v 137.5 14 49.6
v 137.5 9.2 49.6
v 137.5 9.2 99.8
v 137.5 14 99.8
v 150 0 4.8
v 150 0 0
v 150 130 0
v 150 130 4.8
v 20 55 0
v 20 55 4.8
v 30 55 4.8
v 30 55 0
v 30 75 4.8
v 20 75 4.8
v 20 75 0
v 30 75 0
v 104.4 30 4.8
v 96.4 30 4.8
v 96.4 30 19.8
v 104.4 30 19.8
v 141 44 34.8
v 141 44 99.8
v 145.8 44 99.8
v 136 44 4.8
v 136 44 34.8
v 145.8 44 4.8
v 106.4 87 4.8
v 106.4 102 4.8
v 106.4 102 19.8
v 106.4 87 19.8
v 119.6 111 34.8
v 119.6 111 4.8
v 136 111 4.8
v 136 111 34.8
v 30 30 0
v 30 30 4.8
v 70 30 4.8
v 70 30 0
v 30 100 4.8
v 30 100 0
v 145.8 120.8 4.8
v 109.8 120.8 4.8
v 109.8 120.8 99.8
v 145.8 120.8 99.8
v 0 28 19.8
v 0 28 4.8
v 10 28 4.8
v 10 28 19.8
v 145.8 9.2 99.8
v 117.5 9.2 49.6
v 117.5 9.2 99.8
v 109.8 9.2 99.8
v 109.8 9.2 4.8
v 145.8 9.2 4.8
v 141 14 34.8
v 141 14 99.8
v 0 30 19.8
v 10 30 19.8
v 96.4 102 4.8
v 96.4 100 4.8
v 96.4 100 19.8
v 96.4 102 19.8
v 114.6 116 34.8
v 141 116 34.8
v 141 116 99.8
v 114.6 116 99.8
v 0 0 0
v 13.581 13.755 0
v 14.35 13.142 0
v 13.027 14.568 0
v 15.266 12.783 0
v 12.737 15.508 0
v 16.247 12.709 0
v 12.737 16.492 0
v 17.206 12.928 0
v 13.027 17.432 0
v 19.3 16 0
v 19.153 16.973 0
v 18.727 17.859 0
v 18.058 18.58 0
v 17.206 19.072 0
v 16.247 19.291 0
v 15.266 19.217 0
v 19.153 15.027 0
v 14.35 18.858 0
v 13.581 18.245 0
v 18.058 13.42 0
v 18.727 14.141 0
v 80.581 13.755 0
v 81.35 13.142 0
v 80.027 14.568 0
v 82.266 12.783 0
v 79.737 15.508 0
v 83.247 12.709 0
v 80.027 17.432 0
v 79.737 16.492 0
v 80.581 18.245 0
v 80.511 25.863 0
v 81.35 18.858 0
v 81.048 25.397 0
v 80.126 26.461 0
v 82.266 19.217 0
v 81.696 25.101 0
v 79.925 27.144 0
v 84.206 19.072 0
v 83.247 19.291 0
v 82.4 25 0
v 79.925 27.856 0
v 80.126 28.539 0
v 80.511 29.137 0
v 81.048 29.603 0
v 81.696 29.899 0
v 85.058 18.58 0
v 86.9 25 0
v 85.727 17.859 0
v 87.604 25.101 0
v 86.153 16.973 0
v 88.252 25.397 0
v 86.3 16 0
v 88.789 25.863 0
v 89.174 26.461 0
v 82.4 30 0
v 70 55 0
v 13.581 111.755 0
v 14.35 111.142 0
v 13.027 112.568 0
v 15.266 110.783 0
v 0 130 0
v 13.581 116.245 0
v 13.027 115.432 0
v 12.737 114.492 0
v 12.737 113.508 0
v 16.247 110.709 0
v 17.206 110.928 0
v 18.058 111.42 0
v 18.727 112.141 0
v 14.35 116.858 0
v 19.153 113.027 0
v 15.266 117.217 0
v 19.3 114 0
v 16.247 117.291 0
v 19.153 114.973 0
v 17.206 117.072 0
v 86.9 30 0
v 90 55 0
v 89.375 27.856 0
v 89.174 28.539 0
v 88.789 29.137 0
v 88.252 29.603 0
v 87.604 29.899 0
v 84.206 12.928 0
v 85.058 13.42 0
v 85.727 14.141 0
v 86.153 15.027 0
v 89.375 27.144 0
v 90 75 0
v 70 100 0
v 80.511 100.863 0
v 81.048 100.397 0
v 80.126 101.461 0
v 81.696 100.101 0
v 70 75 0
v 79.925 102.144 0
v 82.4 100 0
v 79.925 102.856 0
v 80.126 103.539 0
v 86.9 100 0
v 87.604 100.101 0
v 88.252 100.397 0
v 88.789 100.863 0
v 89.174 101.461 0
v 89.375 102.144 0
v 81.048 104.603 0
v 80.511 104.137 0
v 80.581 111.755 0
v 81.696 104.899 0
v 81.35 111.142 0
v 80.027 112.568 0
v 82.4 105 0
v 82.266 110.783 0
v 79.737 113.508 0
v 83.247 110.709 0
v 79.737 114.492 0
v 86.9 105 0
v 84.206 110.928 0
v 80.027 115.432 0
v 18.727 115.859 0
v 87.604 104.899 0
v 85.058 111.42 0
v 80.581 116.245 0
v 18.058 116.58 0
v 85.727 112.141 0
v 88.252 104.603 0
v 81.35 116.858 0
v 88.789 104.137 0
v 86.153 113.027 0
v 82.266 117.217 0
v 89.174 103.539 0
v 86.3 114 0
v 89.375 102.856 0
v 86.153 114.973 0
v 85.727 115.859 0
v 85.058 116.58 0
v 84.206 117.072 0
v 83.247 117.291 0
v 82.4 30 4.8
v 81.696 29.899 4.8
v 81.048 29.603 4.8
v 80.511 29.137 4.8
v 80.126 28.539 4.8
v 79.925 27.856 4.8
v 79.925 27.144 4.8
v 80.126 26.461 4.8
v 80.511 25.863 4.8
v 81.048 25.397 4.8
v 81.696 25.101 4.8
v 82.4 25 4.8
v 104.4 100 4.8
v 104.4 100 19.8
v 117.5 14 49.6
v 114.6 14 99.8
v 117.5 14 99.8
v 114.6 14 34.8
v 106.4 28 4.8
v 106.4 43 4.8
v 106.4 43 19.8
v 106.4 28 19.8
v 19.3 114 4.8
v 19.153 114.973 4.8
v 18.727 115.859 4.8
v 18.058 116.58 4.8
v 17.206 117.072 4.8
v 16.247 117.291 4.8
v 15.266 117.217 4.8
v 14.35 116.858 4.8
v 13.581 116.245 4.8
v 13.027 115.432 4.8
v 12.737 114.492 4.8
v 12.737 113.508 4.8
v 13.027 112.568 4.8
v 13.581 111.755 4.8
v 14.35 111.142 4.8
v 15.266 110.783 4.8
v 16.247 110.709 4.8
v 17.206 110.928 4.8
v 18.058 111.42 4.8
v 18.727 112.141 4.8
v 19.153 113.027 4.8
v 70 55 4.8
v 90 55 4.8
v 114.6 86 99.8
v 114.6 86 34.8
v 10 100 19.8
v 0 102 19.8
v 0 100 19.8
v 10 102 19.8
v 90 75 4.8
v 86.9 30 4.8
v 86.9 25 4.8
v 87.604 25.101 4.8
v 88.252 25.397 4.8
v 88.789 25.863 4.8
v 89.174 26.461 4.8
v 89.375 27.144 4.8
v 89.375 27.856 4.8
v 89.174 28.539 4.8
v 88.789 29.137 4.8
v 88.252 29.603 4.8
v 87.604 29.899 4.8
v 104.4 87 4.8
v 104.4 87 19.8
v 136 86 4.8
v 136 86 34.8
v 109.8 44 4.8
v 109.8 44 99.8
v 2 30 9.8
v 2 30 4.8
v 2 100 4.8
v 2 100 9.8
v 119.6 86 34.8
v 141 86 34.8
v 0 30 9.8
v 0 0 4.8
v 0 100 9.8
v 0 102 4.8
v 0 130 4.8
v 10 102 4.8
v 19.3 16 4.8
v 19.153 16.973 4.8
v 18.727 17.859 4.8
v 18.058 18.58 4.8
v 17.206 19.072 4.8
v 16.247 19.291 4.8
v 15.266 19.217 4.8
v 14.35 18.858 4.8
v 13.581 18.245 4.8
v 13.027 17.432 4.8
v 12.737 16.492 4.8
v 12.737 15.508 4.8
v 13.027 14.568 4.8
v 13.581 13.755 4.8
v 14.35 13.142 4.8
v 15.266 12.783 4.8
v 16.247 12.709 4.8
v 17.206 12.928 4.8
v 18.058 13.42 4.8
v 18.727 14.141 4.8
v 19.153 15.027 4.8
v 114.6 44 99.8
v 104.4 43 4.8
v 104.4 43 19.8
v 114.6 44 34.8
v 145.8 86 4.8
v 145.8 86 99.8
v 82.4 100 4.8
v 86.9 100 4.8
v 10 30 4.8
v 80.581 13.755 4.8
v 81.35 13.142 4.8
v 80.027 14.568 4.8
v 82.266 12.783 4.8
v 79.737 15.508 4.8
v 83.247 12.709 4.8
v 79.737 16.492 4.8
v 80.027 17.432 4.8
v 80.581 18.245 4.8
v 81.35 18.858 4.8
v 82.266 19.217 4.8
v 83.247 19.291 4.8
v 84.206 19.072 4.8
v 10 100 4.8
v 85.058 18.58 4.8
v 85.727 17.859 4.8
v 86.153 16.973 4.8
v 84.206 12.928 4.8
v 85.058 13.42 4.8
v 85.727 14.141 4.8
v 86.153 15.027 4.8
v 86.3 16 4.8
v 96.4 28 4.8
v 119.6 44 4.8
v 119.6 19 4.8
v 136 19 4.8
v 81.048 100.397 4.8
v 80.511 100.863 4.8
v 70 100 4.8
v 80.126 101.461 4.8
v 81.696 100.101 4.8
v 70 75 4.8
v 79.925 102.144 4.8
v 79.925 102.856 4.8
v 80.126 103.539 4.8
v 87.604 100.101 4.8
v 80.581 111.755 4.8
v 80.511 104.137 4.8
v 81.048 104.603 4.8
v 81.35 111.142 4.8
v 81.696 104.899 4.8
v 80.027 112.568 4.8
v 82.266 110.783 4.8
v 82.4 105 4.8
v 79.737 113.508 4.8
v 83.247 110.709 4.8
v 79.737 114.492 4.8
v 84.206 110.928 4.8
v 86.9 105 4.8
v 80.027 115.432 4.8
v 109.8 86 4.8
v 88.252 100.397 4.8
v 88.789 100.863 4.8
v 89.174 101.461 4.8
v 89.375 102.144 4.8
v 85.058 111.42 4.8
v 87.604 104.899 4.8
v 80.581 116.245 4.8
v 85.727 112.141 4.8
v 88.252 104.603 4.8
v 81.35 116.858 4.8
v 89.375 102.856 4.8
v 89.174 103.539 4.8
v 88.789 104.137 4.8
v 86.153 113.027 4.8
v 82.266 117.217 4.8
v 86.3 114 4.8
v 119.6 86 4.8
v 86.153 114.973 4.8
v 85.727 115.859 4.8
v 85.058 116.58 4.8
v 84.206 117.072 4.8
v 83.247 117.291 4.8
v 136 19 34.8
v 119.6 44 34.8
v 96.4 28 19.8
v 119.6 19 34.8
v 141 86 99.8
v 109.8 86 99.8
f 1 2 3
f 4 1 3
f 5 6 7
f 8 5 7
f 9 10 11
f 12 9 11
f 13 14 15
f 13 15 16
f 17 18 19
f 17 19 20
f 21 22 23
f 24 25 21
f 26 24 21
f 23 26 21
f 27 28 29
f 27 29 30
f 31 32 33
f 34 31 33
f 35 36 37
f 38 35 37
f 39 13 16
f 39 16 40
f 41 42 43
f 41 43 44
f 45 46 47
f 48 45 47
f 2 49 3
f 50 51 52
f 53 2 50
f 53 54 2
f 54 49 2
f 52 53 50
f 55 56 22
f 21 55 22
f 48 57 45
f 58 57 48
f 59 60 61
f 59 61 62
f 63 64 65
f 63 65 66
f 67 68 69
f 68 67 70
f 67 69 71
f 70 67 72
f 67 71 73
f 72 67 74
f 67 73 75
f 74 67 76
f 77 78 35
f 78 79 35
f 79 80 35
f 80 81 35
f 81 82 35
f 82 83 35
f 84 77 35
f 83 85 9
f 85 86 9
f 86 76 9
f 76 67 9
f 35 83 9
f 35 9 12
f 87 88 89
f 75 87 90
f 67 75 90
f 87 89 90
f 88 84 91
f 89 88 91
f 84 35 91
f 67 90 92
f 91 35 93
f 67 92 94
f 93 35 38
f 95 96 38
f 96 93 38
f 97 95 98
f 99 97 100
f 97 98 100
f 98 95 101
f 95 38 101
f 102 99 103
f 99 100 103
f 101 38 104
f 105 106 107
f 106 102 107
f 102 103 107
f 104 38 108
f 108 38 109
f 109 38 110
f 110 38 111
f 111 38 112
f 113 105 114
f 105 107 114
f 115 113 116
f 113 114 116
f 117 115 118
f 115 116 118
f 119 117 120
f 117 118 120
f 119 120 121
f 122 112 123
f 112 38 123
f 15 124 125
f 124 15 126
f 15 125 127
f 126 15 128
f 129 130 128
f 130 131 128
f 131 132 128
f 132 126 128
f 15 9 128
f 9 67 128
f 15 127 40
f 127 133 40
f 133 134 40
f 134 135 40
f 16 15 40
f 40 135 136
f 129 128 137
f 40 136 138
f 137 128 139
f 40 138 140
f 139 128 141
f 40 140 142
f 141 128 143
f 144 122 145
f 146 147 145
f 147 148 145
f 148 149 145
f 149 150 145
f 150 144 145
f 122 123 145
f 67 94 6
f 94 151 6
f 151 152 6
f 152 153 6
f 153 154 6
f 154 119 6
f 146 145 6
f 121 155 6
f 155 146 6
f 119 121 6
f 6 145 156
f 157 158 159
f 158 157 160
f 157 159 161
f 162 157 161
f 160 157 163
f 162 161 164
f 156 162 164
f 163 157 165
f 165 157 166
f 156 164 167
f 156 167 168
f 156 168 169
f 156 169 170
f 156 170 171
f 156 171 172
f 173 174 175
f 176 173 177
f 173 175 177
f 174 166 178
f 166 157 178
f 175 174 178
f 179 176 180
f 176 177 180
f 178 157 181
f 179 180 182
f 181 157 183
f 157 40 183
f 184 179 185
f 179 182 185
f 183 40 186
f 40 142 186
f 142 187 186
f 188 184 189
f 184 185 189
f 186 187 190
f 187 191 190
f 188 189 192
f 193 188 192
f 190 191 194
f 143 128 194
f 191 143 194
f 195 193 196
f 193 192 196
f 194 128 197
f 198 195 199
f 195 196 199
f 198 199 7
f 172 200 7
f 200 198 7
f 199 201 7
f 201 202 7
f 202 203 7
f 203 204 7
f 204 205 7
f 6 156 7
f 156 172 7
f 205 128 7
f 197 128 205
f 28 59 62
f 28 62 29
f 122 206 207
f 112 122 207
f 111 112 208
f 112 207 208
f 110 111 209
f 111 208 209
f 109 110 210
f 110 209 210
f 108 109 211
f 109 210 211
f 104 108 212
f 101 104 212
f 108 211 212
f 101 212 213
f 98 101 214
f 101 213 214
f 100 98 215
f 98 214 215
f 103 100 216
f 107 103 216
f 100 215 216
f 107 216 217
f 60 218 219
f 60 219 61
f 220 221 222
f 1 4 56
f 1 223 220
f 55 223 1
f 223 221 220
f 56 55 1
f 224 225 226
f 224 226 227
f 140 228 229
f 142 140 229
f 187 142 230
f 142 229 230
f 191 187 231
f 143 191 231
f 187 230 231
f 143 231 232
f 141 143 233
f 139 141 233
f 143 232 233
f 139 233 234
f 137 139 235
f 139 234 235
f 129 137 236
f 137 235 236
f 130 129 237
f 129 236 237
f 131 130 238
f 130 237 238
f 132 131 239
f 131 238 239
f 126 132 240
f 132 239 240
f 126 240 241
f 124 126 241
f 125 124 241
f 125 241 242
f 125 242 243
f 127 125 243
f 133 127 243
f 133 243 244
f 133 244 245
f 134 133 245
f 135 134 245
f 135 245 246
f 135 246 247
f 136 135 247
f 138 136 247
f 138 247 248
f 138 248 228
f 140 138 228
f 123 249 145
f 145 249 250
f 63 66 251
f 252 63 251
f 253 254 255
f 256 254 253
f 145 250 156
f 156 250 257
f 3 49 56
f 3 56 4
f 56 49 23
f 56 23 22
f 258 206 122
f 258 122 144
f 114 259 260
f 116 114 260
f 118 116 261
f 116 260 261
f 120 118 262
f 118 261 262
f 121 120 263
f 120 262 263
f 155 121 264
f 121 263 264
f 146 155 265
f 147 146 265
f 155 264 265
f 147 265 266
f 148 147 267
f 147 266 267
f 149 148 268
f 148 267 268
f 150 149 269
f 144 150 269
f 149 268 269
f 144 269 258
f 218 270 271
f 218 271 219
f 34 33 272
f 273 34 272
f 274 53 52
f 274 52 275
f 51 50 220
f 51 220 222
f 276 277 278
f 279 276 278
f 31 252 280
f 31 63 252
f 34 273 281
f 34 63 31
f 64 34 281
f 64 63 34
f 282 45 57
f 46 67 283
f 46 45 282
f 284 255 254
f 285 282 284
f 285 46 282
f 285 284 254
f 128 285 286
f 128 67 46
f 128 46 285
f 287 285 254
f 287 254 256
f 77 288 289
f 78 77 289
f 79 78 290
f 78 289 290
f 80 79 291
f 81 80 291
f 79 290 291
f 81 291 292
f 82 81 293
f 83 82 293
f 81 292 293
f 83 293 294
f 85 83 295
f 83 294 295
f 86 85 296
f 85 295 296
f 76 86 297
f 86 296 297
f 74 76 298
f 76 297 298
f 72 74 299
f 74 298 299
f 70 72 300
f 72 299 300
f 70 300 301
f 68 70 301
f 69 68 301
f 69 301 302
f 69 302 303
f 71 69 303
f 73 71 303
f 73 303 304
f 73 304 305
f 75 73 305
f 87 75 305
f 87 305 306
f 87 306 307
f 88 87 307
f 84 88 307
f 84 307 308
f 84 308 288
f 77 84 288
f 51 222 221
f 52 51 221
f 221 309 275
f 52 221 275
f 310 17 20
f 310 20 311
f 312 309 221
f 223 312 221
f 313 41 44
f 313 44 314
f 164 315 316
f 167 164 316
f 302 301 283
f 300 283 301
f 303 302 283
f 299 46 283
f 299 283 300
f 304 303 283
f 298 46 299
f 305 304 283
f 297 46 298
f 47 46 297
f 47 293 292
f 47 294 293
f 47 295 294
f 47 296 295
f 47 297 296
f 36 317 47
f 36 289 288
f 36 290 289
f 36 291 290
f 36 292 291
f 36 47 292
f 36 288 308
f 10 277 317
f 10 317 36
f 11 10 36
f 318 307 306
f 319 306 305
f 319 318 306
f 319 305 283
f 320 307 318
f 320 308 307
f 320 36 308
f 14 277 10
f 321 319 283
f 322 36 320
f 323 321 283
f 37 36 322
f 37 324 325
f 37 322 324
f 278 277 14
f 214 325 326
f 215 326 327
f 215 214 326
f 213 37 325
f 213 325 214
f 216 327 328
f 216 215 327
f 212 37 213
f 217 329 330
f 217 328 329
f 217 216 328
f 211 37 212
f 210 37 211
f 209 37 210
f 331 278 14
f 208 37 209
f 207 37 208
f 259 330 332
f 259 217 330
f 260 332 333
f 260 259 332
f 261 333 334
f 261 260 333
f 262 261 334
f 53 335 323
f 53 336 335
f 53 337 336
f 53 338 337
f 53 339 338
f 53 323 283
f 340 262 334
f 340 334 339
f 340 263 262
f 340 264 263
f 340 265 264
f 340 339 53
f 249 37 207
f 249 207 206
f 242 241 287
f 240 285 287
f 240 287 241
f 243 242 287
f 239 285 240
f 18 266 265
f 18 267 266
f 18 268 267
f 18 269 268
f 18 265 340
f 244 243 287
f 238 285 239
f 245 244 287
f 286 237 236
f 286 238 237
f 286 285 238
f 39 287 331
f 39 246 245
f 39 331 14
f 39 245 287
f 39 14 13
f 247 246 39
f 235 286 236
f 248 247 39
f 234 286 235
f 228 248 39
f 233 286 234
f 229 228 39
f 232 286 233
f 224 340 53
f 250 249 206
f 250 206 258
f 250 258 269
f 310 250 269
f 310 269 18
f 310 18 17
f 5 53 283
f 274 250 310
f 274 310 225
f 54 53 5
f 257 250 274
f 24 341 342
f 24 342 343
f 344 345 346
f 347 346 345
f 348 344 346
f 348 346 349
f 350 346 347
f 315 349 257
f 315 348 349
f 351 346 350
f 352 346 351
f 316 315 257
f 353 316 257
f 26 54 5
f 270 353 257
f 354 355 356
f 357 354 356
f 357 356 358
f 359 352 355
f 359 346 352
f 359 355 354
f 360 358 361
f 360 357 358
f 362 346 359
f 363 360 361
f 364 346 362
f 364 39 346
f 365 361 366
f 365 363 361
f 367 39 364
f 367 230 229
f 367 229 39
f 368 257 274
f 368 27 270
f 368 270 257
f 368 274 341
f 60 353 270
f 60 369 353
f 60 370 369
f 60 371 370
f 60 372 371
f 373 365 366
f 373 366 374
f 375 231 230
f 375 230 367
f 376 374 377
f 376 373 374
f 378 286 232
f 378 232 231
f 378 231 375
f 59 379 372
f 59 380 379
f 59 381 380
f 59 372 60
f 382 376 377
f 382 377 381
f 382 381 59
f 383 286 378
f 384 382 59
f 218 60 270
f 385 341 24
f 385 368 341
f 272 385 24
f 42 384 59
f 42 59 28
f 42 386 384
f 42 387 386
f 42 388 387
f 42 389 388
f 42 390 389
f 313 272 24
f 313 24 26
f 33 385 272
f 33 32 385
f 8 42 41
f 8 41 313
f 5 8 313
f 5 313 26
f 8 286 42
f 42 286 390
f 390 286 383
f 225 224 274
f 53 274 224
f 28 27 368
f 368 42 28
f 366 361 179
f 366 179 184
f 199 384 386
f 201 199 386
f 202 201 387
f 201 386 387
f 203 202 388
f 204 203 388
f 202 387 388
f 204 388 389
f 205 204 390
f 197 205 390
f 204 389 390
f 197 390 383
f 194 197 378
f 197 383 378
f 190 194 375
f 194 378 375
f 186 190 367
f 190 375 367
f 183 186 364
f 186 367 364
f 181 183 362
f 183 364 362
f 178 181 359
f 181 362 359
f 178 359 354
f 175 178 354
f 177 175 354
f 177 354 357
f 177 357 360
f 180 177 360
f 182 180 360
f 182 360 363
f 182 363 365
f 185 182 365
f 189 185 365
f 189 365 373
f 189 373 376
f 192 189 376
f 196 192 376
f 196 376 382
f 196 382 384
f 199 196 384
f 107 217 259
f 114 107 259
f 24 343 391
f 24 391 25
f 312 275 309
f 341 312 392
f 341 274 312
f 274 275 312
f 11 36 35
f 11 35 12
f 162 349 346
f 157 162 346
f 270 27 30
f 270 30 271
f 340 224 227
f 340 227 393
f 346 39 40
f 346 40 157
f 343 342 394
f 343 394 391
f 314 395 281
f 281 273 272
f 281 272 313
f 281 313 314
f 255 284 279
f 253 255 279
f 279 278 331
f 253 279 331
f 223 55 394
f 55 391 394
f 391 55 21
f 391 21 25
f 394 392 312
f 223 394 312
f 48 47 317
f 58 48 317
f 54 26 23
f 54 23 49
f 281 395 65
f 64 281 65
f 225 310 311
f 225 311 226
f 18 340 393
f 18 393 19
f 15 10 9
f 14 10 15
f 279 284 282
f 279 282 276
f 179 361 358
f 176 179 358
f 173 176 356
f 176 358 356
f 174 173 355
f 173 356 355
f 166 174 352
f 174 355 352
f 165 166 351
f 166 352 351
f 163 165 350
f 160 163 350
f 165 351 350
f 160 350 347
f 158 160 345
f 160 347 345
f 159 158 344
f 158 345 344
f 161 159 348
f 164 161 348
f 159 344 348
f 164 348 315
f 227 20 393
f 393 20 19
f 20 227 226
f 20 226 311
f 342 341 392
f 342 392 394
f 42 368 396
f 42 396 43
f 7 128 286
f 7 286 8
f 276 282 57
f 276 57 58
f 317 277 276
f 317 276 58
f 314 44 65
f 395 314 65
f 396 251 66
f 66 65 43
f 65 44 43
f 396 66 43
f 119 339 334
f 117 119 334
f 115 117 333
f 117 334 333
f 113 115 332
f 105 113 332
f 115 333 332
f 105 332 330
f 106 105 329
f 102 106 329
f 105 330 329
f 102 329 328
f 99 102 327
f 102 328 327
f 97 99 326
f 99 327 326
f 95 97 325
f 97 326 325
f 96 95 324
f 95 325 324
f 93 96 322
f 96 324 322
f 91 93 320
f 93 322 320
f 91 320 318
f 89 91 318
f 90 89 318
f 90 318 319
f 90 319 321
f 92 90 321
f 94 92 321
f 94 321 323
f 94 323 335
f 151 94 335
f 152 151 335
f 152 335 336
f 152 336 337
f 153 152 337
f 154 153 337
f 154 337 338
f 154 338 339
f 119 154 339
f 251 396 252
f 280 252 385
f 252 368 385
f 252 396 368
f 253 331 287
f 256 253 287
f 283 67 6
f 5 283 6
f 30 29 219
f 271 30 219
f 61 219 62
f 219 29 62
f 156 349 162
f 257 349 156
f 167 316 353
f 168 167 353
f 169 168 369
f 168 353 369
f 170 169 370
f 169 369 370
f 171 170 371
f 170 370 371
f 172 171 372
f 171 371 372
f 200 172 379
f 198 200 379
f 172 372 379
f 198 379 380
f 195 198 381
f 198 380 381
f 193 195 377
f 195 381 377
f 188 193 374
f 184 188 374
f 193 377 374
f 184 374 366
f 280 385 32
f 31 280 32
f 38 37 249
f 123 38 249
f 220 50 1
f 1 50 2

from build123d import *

# Parameters (mm, degrees)
SKETCH_W            = 150
SKETCH_H            = 130
PAD_DEPTH           = 4.8
SKETCH001_R         = 3.3
POCKET_DEPTH        = 4.801
MIRROREDSKETCH_R    = 3.3
POCKET001_DEPTH     = 4.801
MIRROREDSKETCH001_R = 3.3
POCKET002_DEPTH     = 4.801
MIRROREDSKETCH002_R = 3.3
POCKET003_DEPTH     = 4.801
SKETCH002_W         = 2
SKETCH002_H         = 70
PAD001_DEPTH        = 5
SKETCH003_W         = 10
SKETCH003_H         = 2
PAD002_DEPTH        = 15
MIRROREDSKETCH003_W = 10
MIRROREDSKETCH003_H = 2
PAD003_DEPTH        = 15
PAD004_DEPTH        = 15
PAD005_DEPTH        = 15
PAD006_DEPTH        = 95
PAD007_DEPTH        = 95
SKETCH007_W         = 20
SKETCH007_H         = 60
POCKET004_DEPTH     = 5
PAD008_DEPTH        = 30
PAD009_DEPTH        = 30
SKETCH009_W         = 40
SKETCH009_H         = 70
POCKET005_DEPTH     = 4.801
SKETCH010_W         = 70
SKETCH010_H         = 20
POCKET006_DEPTH     = 4.801
POCKET007_DEPTH     = 4.801
POCKET008_DEPTH     = 4.801


with BuildPart() as part:
    # Sketch → Pad (new body)
    with BuildSketch(Plane.XY):
        with Locations((75, 65)):
            Rectangle(SKETCH_W, SKETCH_H)
    extrude(amount=PAD_DEPTH)

    # Sketch001 (on Face6 of Pad) → Pocket (cut, through all)
    with BuildSketch(Plane.XY.offset(4.8)):
        with Locations((16, 16)):
            Circle(SKETCH001_R)
    extrude(amount=-POCKET_DEPTH, mode=Mode.SUBTRACT)

    # MirroredSketch → Pocket001 (cut, through all)
    with BuildSketch(Plane.XY.offset(4.8)):
        with Locations((16, 114)):
            Circle(MIRROREDSKETCH_R)
    extrude(amount=-POCKET001_DEPTH, mode=Mode.SUBTRACT)

    # MirroredSketch001 → Pocket002 (cut, through all)
    with BuildSketch(Plane.XY.offset(4.8)):
        with Locations((83, 16)):
            Circle(MIRROREDSKETCH001_R)
    extrude(amount=-POCKET002_DEPTH, mode=Mode.SUBTRACT)

    # MirroredSketch002 → Pocket003 (cut, through all)
    with BuildSketch(Plane.XY.offset(4.8)):
        with Locations((83, 114)):
            Circle(MIRROREDSKETCH002_R)
    extrude(amount=-POCKET003_DEPTH, mode=Mode.SUBTRACT)

    # Sketch002 (on Face5 of Pocket003) → Pad001 (join)
    with BuildSketch(Plane.XY.offset(4.8)):
        with Locations((1, 65)):
            Rectangle(SKETCH002_W, SKETCH002_H)
    extrude(amount=PAD001_DEPTH)

    # Sketch003 (on Face5 of Pad001) → Pad002 (join)
    with BuildSketch(Plane.XY.offset(4.8)):
        with Locations((5, 29)):
            Rectangle(SKETCH003_W, SKETCH003_H)
    extrude(amount=PAD002_DEPTH)

    # MirroredSketch003 → Pad003 (join)
    with BuildSketch(Plane.XY.offset(4.8)):
        with Locations((5, 101)):
            Rectangle(MIRROREDSKETCH003_W, MIRROREDSKETCH003_H)
    extrude(amount=PAD003_DEPTH)

    # Sketch004 (on Face5 of Pad003) → Pad004 (join)
    with BuildSketch(Plane.XY.offset(4.8)):
        Polygon((96.4, 100), (96.4, 102), (106.4, 102), (106.4, 87), (104.4, 87), (104.4, 100), align=None)
    extrude(amount=PAD004_DEPTH)

    # Sketch005 (on Face5 of Pad004) → Pad005 (join)
    with BuildSketch(Plane.XY.offset(4.8)):
        Polygon((96.4, 30), (104.4, 30), (104.4, 43), (106.4, 43), (106.4, 28), (96.4, 28), align=None)
    extrude(amount=PAD005_DEPTH)

    # Sketch006 (on Face5 of Pad005) → Pad006 (join)
    with BuildSketch(Plane.XY.offset(4.8)):
        Polygon((109.8, 86), (109.8, 120.8), (145.8, 120.8), (145.8, 86), (141, 86), (141, 116), (114.6, 116), (114.6, 86), align=None)
    extrude(amount=PAD006_DEPTH)

    # MirroredSketch005 → Pad007 (join)
    with BuildSketch(Plane.XY.offset(4.8)):
        Polygon((145.8, 44), (145.8, 9.2), (109.8, 9.2), (109.8, 44), (114.6, 44), (114.6, 14), (141, 14), (141, 44), align=None)
    extrude(amount=PAD007_DEPTH)

    # Sketch007 (on Face33 of Pad007) → Pocket004 (cut)
    with BuildSketch(Plane.XZ.offset(-9.2)):
        with Locations((127.5, 79.6)):
            Rectangle(SKETCH007_W, SKETCH007_H)
    extrude(amount=-POCKET004_DEPTH, mode=Mode.SUBTRACT)

    # Sketch008 (on Face5 of Pocket004) → Pad008 (join)
    with BuildSketch(Plane.XY.offset(4.8)):
        Polygon((114.6, 86), (119.6, 86), (119.6, 111), (136, 111), (136, 86), (141, 86), (141, 116), (114.6, 116), align=None)
    extrude(amount=PAD008_DEPTH)

    # MirroredSketch006 → Pad009 (join)
    with BuildSketch(Plane.XY.offset(4.8)):
        Polygon((114.6, 44), (119.6, 44), (119.6, 19), (136, 19), (136, 44), (141, 44), (141, 14), (114.6, 14), align=None)
    extrude(amount=PAD009_DEPTH)

    # Sketch009 (on Face5 of Pad009) → Pocket005 (cut, through all)
    with BuildSketch(Plane.XY.offset(4.8)):
        with Locations((50, 65)):
            Rectangle(SKETCH009_W, SKETCH009_H)
    extrude(amount=-POCKET005_DEPTH, mode=Mode.SUBTRACT)

    # Sketch010 (on Face5 of Pocket005) → Pocket006 (cut, through all)
    with BuildSketch(Plane.XY.offset(4.8)):
        with Locations((55, 65)):
            Rectangle(SKETCH010_W, SKETCH010_H)
    extrude(amount=-POCKET006_DEPTH, mode=Mode.SUBTRACT)

    # Sketch011 (on Face5 of Pocket006) → Pocket007 (cut, through all)
    with BuildSketch(Plane.XY.offset(4.8)):
        with BuildLine():
            ThreePointArc((82.4, 30), (79.9, 27.5), (82.4, 25))
            Line((82.4, 25), (86.9, 25))
            ThreePointArc((86.9, 25), (89.4, 27.5), (86.9, 30))
            Line((82.4, 30), (86.9, 30))
        make_face()
    extrude(amount=-POCKET007_DEPTH, mode=Mode.SUBTRACT)

    # MirroredSketch007 → Pocket008 (cut, through all)
    with BuildSketch(Plane.XY.offset(4.8)):
        with BuildLine():
            ThreePointArc((82.4, 105), (79.9, 102.5), (82.4, 100))
            Line((82.4, 100), (86.9, 100))
            ThreePointArc((86.9, 100), (89.4, 102.5), (86.9, 105))
            Line((82.4, 105), (86.9, 105))
        make_face()
    extrude(amount=-POCKET008_DEPTH, mode=Mode.SUBTRACT)


solid = part.part
